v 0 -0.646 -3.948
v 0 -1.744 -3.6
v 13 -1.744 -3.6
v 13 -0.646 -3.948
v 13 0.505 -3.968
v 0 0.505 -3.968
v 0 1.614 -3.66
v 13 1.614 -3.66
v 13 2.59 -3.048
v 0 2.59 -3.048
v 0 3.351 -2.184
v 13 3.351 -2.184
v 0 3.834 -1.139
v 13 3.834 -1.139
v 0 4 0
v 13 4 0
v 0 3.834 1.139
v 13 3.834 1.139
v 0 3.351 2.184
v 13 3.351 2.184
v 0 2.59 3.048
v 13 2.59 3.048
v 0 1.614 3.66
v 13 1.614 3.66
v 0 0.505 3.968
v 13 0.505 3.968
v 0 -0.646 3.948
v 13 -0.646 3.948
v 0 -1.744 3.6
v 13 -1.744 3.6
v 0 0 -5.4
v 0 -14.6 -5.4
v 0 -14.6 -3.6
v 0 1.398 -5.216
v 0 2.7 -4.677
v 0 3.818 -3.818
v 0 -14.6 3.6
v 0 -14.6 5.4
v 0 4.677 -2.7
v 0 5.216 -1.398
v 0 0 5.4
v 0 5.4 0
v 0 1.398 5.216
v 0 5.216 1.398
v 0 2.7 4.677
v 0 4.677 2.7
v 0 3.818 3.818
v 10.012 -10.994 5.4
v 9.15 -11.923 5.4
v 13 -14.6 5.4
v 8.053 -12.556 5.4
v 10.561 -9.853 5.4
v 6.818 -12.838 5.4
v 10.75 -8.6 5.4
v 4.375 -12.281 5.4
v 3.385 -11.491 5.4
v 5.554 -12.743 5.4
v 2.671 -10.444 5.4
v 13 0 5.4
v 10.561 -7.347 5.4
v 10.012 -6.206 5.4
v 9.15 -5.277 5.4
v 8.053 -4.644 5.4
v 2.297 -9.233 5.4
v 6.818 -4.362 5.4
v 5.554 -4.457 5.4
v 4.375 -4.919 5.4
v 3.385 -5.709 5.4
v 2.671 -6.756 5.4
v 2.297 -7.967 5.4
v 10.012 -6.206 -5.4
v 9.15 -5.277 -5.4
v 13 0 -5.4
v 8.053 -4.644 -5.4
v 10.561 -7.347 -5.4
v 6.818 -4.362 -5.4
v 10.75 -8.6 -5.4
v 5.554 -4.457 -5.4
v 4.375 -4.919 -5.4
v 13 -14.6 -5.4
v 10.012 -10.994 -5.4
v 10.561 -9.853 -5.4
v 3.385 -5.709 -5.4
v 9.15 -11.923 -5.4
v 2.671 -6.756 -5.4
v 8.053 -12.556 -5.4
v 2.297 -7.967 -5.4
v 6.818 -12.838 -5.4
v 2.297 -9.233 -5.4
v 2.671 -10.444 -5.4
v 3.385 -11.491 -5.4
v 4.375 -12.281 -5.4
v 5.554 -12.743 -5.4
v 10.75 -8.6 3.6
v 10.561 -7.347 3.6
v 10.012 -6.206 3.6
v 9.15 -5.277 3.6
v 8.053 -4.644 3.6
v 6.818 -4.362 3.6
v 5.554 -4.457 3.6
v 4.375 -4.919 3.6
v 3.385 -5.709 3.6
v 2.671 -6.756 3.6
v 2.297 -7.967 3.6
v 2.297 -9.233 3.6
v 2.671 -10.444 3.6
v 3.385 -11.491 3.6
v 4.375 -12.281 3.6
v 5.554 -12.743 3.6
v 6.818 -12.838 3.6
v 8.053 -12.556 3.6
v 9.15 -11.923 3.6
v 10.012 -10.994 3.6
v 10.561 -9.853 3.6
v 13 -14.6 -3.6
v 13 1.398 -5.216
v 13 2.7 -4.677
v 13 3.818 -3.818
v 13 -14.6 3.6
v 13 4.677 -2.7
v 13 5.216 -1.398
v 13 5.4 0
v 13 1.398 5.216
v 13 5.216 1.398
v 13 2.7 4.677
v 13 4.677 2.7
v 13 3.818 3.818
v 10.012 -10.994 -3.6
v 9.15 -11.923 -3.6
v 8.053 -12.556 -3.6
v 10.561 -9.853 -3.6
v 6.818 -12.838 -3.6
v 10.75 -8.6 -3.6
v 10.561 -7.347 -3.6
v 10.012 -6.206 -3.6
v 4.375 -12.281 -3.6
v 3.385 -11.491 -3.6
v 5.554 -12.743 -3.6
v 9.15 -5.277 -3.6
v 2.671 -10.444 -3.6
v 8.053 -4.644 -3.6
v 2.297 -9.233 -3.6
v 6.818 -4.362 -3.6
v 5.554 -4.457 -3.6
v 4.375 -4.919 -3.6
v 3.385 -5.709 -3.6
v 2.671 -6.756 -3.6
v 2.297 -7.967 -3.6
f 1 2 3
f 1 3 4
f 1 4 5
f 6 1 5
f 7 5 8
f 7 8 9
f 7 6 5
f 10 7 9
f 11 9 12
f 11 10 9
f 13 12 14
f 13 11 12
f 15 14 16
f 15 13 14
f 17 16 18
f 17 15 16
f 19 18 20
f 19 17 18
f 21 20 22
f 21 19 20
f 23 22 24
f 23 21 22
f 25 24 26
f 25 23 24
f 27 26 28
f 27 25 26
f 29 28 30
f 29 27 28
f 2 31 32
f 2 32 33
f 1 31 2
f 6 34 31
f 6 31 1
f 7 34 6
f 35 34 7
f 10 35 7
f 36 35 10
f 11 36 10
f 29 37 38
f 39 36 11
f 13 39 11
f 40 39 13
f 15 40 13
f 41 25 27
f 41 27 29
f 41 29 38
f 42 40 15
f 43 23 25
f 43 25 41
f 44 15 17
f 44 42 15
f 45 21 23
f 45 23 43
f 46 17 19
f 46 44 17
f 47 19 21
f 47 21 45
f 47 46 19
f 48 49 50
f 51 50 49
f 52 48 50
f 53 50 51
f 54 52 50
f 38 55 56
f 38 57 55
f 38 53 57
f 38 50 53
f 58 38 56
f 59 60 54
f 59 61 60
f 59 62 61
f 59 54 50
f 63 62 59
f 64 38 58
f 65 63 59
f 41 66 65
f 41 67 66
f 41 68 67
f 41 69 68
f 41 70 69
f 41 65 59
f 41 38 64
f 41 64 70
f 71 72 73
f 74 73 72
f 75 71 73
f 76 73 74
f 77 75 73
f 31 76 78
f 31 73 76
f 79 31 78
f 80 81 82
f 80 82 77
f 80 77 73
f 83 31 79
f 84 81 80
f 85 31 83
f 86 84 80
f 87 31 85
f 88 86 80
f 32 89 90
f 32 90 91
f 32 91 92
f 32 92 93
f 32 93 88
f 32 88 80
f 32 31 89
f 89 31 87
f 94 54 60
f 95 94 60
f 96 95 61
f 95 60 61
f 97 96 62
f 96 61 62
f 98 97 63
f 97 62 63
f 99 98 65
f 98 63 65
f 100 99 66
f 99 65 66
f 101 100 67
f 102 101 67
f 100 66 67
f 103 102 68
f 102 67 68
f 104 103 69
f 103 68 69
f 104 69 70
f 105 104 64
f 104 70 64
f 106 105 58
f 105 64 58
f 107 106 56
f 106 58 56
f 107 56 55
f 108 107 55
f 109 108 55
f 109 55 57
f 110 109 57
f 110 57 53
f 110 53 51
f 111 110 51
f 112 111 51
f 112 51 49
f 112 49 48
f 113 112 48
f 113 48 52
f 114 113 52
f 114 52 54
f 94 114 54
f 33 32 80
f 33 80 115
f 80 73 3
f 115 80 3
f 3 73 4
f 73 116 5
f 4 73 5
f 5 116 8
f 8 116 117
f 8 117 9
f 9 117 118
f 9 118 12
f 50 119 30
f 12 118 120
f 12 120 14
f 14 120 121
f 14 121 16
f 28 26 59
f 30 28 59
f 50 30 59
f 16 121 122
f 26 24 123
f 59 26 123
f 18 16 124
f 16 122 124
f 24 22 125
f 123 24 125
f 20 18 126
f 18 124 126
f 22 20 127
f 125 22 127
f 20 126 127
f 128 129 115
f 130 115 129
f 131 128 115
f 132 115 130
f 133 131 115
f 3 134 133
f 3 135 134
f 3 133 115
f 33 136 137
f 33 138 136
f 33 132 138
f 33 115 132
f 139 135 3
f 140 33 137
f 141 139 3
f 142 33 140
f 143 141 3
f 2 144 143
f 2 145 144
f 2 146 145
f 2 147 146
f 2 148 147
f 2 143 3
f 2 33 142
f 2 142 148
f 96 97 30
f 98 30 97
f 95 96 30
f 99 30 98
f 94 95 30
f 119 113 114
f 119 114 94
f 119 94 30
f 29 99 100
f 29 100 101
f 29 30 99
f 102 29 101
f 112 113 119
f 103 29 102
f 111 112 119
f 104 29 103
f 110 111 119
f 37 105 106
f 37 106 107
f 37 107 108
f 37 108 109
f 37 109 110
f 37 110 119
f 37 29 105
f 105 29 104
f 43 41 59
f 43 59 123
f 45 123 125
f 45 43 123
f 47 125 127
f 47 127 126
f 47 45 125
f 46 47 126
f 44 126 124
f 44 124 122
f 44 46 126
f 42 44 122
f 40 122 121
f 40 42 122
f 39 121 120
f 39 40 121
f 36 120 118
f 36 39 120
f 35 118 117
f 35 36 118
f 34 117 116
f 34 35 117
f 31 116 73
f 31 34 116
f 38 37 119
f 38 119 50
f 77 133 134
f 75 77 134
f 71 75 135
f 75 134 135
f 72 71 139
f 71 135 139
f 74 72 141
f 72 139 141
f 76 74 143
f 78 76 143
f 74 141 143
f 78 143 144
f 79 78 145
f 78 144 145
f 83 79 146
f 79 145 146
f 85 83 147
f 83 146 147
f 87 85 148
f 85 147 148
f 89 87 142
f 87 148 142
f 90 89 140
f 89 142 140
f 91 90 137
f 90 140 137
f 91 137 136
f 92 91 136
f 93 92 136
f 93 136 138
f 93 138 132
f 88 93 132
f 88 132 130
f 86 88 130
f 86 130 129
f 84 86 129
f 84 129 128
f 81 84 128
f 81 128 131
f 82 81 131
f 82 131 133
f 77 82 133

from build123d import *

# Parameters (mm, degrees)
BOSS_EXTRUDE1_DEPTH = 13
SKETCH2_R           = 4.25
CUT_EXTRUDE1_DEPTH  = 23.33383084


with BuildPart() as part:
    # Sketch1 → Boss-Extrude1 (new body)
    with BuildSketch(Plane(origin=(0, 0, 0), x_dir=(0, 0, -1), z_dir=(1, 0, 0))):
        with BuildLine():
            Line((5.4, 0), (5.4, -14.6))
            Line((5.4, -14.6), (3.6, -14.6))
            Line((3.6, -14.6), (3.6, -1.743559577))
            ThreePointArc((3.6, -1.743559577), (0, 4), (-3.6, -1.743559577))
            Line((-3.6, -1.743559577), (-3.6, -14.6))
            Line((-3.6, -14.6), (-5.4, -14.6))
            Line((-5.4, -14.6), (-5.4, 0))
            ThreePointArc((-5.4, 0), (0, 5.4), (5.4, 0))
        make_face()
    extrude(amount=BOSS_EXTRUDE1_DEPTH)

    # Sketch2 → Cut-Extrude1 (cut, through all)
    with BuildSketch(Plane.XY.offset(5.4)):
        with Locations((6.5, -8.6)):
            Circle(SKETCH2_R)
    extrude(amount=-CUT_EXTRUDE1_DEPTH, mode=Mode.SUBTRACT)


solid = part.part
